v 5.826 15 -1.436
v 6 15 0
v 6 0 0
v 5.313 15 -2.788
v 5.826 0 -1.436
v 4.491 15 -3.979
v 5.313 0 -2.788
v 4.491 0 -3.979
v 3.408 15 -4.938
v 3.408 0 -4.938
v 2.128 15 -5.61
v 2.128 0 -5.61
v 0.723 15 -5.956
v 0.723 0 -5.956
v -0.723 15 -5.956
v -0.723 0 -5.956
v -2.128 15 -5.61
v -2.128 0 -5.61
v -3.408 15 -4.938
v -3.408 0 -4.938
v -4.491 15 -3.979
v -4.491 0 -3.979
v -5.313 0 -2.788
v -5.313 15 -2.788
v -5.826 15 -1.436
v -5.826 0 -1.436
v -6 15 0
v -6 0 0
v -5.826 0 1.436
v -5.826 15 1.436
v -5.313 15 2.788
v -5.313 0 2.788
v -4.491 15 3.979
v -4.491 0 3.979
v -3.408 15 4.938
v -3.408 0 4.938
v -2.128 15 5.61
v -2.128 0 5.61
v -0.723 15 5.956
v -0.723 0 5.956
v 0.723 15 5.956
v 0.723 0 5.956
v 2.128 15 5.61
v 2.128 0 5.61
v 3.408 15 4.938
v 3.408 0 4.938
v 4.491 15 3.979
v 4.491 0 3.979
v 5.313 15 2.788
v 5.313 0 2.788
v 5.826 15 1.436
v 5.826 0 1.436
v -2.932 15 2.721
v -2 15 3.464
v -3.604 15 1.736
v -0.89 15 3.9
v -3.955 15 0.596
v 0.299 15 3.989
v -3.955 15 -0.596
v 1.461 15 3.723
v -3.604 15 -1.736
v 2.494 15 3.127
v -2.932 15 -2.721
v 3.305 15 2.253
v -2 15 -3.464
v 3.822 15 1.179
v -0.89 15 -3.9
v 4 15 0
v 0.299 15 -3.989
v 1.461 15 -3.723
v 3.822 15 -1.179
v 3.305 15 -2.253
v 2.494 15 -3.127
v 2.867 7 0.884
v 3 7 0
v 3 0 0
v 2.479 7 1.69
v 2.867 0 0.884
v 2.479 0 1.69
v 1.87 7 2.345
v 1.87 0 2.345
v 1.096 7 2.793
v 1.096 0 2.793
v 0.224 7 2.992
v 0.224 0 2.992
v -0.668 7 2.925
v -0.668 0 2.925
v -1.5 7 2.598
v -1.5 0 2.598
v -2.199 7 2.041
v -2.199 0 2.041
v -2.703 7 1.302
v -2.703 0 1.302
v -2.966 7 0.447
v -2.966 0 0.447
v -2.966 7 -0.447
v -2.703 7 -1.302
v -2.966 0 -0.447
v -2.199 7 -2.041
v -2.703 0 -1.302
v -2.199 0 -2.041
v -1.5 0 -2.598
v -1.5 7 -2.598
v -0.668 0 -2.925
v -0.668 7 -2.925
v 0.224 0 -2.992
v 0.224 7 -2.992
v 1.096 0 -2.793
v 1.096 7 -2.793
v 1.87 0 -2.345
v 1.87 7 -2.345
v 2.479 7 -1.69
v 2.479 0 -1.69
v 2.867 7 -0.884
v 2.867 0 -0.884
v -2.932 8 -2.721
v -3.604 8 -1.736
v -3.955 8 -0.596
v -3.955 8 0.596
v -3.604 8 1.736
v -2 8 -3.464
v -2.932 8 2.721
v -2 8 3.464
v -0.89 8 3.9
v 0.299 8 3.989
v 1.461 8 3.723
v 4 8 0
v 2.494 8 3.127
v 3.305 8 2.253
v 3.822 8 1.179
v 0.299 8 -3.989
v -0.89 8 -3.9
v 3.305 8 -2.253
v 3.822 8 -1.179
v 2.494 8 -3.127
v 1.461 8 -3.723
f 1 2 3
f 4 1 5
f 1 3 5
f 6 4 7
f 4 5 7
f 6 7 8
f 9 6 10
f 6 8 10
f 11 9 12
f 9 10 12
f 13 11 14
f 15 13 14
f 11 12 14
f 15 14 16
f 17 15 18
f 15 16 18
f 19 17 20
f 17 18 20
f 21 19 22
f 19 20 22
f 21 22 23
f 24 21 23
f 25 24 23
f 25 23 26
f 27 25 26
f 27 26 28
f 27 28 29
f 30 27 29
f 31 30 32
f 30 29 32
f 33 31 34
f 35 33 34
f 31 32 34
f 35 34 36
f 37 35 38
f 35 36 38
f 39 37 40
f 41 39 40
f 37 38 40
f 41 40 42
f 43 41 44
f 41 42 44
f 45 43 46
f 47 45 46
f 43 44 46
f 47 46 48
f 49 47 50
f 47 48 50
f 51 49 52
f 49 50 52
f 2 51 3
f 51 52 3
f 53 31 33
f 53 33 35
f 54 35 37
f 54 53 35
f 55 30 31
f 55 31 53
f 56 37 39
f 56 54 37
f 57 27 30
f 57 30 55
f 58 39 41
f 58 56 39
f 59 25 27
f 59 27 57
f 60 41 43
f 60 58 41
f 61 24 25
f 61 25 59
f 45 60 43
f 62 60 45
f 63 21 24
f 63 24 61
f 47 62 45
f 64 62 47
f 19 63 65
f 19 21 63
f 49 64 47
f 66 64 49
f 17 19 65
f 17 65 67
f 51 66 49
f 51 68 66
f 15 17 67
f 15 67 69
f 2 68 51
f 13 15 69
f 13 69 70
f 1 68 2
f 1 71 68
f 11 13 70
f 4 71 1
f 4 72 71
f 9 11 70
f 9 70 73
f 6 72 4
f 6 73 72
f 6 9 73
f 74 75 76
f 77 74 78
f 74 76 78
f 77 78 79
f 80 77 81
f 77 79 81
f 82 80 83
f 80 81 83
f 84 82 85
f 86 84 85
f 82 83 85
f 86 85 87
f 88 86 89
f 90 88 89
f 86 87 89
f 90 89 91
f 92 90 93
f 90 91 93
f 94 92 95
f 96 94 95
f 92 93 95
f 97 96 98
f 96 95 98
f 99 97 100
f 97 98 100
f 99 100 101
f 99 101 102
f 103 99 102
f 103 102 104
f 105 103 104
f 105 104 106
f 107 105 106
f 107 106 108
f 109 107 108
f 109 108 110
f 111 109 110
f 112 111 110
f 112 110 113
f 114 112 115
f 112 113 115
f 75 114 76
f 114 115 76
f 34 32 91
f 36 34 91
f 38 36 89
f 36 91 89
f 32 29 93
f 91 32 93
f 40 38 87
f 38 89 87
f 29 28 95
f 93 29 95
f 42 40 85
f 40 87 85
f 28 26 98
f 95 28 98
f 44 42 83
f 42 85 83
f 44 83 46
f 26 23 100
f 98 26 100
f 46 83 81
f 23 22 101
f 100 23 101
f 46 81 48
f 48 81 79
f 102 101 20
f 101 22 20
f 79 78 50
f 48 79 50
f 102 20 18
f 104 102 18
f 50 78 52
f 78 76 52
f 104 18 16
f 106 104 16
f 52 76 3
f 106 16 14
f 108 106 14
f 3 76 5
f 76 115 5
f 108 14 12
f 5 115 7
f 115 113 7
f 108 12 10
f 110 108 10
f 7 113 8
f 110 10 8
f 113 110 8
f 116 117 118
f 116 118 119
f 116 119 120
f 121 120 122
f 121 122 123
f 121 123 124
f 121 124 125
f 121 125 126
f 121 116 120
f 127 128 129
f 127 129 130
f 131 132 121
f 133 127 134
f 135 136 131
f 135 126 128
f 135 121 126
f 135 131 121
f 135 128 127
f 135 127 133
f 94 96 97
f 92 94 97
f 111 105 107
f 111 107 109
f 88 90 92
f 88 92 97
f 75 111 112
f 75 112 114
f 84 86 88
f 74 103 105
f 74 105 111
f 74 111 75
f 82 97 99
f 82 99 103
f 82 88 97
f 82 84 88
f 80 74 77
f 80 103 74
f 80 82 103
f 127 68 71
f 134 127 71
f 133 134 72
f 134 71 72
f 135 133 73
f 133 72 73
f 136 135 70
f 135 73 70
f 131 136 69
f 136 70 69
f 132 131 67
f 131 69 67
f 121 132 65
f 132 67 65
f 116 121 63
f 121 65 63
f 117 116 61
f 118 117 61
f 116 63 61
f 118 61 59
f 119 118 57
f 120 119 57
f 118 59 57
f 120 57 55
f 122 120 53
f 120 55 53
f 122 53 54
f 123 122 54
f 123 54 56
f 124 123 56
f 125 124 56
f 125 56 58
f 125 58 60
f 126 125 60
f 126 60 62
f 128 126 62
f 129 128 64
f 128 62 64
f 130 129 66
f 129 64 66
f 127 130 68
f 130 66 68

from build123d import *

# Parameters (mm, degrees)
SKETCH1_R           = 6
BOSS_EXTRUDE1_DEPTH = 15
SKETCH2_R           = 3
CUT_EXTRUDE1_DEPTH  = 7
SKETCH3_R           = 4
CUT_EXTRUDE2_DEPTH  = 7


with BuildPart() as part:
    # Sketch1 → Boss-Extrude1 (new body)
    with BuildSketch(Plane(origin=(0, 0, 0), x_dir=(1, 0, 0), z_dir=(0, 1, 0))):
        Circle(SKETCH1_R)
    extrude(amount=BOSS_EXTRUDE1_DEPTH)

    # Sketch2 → Cut-Extrude1 (cut)
    with BuildSketch(Plane.XZ):
        Circle(SKETCH2_R)
    extrude(amount=-CUT_EXTRUDE1_DEPTH, mode=Mode.SUBTRACT)

    # Sketch3 → Cut-Extrude2 (cut)
    with BuildSketch(Plane(origin=(0, 15, 0), x_dir=(1, 0, 0), z_dir=(0, 1, 0))):
        Circle(SKETCH3_R)
    extrude(amount=-CUT_EXTRUDE2_DEPTH, mode=Mode.SUBTRACT)


solid = part.part
